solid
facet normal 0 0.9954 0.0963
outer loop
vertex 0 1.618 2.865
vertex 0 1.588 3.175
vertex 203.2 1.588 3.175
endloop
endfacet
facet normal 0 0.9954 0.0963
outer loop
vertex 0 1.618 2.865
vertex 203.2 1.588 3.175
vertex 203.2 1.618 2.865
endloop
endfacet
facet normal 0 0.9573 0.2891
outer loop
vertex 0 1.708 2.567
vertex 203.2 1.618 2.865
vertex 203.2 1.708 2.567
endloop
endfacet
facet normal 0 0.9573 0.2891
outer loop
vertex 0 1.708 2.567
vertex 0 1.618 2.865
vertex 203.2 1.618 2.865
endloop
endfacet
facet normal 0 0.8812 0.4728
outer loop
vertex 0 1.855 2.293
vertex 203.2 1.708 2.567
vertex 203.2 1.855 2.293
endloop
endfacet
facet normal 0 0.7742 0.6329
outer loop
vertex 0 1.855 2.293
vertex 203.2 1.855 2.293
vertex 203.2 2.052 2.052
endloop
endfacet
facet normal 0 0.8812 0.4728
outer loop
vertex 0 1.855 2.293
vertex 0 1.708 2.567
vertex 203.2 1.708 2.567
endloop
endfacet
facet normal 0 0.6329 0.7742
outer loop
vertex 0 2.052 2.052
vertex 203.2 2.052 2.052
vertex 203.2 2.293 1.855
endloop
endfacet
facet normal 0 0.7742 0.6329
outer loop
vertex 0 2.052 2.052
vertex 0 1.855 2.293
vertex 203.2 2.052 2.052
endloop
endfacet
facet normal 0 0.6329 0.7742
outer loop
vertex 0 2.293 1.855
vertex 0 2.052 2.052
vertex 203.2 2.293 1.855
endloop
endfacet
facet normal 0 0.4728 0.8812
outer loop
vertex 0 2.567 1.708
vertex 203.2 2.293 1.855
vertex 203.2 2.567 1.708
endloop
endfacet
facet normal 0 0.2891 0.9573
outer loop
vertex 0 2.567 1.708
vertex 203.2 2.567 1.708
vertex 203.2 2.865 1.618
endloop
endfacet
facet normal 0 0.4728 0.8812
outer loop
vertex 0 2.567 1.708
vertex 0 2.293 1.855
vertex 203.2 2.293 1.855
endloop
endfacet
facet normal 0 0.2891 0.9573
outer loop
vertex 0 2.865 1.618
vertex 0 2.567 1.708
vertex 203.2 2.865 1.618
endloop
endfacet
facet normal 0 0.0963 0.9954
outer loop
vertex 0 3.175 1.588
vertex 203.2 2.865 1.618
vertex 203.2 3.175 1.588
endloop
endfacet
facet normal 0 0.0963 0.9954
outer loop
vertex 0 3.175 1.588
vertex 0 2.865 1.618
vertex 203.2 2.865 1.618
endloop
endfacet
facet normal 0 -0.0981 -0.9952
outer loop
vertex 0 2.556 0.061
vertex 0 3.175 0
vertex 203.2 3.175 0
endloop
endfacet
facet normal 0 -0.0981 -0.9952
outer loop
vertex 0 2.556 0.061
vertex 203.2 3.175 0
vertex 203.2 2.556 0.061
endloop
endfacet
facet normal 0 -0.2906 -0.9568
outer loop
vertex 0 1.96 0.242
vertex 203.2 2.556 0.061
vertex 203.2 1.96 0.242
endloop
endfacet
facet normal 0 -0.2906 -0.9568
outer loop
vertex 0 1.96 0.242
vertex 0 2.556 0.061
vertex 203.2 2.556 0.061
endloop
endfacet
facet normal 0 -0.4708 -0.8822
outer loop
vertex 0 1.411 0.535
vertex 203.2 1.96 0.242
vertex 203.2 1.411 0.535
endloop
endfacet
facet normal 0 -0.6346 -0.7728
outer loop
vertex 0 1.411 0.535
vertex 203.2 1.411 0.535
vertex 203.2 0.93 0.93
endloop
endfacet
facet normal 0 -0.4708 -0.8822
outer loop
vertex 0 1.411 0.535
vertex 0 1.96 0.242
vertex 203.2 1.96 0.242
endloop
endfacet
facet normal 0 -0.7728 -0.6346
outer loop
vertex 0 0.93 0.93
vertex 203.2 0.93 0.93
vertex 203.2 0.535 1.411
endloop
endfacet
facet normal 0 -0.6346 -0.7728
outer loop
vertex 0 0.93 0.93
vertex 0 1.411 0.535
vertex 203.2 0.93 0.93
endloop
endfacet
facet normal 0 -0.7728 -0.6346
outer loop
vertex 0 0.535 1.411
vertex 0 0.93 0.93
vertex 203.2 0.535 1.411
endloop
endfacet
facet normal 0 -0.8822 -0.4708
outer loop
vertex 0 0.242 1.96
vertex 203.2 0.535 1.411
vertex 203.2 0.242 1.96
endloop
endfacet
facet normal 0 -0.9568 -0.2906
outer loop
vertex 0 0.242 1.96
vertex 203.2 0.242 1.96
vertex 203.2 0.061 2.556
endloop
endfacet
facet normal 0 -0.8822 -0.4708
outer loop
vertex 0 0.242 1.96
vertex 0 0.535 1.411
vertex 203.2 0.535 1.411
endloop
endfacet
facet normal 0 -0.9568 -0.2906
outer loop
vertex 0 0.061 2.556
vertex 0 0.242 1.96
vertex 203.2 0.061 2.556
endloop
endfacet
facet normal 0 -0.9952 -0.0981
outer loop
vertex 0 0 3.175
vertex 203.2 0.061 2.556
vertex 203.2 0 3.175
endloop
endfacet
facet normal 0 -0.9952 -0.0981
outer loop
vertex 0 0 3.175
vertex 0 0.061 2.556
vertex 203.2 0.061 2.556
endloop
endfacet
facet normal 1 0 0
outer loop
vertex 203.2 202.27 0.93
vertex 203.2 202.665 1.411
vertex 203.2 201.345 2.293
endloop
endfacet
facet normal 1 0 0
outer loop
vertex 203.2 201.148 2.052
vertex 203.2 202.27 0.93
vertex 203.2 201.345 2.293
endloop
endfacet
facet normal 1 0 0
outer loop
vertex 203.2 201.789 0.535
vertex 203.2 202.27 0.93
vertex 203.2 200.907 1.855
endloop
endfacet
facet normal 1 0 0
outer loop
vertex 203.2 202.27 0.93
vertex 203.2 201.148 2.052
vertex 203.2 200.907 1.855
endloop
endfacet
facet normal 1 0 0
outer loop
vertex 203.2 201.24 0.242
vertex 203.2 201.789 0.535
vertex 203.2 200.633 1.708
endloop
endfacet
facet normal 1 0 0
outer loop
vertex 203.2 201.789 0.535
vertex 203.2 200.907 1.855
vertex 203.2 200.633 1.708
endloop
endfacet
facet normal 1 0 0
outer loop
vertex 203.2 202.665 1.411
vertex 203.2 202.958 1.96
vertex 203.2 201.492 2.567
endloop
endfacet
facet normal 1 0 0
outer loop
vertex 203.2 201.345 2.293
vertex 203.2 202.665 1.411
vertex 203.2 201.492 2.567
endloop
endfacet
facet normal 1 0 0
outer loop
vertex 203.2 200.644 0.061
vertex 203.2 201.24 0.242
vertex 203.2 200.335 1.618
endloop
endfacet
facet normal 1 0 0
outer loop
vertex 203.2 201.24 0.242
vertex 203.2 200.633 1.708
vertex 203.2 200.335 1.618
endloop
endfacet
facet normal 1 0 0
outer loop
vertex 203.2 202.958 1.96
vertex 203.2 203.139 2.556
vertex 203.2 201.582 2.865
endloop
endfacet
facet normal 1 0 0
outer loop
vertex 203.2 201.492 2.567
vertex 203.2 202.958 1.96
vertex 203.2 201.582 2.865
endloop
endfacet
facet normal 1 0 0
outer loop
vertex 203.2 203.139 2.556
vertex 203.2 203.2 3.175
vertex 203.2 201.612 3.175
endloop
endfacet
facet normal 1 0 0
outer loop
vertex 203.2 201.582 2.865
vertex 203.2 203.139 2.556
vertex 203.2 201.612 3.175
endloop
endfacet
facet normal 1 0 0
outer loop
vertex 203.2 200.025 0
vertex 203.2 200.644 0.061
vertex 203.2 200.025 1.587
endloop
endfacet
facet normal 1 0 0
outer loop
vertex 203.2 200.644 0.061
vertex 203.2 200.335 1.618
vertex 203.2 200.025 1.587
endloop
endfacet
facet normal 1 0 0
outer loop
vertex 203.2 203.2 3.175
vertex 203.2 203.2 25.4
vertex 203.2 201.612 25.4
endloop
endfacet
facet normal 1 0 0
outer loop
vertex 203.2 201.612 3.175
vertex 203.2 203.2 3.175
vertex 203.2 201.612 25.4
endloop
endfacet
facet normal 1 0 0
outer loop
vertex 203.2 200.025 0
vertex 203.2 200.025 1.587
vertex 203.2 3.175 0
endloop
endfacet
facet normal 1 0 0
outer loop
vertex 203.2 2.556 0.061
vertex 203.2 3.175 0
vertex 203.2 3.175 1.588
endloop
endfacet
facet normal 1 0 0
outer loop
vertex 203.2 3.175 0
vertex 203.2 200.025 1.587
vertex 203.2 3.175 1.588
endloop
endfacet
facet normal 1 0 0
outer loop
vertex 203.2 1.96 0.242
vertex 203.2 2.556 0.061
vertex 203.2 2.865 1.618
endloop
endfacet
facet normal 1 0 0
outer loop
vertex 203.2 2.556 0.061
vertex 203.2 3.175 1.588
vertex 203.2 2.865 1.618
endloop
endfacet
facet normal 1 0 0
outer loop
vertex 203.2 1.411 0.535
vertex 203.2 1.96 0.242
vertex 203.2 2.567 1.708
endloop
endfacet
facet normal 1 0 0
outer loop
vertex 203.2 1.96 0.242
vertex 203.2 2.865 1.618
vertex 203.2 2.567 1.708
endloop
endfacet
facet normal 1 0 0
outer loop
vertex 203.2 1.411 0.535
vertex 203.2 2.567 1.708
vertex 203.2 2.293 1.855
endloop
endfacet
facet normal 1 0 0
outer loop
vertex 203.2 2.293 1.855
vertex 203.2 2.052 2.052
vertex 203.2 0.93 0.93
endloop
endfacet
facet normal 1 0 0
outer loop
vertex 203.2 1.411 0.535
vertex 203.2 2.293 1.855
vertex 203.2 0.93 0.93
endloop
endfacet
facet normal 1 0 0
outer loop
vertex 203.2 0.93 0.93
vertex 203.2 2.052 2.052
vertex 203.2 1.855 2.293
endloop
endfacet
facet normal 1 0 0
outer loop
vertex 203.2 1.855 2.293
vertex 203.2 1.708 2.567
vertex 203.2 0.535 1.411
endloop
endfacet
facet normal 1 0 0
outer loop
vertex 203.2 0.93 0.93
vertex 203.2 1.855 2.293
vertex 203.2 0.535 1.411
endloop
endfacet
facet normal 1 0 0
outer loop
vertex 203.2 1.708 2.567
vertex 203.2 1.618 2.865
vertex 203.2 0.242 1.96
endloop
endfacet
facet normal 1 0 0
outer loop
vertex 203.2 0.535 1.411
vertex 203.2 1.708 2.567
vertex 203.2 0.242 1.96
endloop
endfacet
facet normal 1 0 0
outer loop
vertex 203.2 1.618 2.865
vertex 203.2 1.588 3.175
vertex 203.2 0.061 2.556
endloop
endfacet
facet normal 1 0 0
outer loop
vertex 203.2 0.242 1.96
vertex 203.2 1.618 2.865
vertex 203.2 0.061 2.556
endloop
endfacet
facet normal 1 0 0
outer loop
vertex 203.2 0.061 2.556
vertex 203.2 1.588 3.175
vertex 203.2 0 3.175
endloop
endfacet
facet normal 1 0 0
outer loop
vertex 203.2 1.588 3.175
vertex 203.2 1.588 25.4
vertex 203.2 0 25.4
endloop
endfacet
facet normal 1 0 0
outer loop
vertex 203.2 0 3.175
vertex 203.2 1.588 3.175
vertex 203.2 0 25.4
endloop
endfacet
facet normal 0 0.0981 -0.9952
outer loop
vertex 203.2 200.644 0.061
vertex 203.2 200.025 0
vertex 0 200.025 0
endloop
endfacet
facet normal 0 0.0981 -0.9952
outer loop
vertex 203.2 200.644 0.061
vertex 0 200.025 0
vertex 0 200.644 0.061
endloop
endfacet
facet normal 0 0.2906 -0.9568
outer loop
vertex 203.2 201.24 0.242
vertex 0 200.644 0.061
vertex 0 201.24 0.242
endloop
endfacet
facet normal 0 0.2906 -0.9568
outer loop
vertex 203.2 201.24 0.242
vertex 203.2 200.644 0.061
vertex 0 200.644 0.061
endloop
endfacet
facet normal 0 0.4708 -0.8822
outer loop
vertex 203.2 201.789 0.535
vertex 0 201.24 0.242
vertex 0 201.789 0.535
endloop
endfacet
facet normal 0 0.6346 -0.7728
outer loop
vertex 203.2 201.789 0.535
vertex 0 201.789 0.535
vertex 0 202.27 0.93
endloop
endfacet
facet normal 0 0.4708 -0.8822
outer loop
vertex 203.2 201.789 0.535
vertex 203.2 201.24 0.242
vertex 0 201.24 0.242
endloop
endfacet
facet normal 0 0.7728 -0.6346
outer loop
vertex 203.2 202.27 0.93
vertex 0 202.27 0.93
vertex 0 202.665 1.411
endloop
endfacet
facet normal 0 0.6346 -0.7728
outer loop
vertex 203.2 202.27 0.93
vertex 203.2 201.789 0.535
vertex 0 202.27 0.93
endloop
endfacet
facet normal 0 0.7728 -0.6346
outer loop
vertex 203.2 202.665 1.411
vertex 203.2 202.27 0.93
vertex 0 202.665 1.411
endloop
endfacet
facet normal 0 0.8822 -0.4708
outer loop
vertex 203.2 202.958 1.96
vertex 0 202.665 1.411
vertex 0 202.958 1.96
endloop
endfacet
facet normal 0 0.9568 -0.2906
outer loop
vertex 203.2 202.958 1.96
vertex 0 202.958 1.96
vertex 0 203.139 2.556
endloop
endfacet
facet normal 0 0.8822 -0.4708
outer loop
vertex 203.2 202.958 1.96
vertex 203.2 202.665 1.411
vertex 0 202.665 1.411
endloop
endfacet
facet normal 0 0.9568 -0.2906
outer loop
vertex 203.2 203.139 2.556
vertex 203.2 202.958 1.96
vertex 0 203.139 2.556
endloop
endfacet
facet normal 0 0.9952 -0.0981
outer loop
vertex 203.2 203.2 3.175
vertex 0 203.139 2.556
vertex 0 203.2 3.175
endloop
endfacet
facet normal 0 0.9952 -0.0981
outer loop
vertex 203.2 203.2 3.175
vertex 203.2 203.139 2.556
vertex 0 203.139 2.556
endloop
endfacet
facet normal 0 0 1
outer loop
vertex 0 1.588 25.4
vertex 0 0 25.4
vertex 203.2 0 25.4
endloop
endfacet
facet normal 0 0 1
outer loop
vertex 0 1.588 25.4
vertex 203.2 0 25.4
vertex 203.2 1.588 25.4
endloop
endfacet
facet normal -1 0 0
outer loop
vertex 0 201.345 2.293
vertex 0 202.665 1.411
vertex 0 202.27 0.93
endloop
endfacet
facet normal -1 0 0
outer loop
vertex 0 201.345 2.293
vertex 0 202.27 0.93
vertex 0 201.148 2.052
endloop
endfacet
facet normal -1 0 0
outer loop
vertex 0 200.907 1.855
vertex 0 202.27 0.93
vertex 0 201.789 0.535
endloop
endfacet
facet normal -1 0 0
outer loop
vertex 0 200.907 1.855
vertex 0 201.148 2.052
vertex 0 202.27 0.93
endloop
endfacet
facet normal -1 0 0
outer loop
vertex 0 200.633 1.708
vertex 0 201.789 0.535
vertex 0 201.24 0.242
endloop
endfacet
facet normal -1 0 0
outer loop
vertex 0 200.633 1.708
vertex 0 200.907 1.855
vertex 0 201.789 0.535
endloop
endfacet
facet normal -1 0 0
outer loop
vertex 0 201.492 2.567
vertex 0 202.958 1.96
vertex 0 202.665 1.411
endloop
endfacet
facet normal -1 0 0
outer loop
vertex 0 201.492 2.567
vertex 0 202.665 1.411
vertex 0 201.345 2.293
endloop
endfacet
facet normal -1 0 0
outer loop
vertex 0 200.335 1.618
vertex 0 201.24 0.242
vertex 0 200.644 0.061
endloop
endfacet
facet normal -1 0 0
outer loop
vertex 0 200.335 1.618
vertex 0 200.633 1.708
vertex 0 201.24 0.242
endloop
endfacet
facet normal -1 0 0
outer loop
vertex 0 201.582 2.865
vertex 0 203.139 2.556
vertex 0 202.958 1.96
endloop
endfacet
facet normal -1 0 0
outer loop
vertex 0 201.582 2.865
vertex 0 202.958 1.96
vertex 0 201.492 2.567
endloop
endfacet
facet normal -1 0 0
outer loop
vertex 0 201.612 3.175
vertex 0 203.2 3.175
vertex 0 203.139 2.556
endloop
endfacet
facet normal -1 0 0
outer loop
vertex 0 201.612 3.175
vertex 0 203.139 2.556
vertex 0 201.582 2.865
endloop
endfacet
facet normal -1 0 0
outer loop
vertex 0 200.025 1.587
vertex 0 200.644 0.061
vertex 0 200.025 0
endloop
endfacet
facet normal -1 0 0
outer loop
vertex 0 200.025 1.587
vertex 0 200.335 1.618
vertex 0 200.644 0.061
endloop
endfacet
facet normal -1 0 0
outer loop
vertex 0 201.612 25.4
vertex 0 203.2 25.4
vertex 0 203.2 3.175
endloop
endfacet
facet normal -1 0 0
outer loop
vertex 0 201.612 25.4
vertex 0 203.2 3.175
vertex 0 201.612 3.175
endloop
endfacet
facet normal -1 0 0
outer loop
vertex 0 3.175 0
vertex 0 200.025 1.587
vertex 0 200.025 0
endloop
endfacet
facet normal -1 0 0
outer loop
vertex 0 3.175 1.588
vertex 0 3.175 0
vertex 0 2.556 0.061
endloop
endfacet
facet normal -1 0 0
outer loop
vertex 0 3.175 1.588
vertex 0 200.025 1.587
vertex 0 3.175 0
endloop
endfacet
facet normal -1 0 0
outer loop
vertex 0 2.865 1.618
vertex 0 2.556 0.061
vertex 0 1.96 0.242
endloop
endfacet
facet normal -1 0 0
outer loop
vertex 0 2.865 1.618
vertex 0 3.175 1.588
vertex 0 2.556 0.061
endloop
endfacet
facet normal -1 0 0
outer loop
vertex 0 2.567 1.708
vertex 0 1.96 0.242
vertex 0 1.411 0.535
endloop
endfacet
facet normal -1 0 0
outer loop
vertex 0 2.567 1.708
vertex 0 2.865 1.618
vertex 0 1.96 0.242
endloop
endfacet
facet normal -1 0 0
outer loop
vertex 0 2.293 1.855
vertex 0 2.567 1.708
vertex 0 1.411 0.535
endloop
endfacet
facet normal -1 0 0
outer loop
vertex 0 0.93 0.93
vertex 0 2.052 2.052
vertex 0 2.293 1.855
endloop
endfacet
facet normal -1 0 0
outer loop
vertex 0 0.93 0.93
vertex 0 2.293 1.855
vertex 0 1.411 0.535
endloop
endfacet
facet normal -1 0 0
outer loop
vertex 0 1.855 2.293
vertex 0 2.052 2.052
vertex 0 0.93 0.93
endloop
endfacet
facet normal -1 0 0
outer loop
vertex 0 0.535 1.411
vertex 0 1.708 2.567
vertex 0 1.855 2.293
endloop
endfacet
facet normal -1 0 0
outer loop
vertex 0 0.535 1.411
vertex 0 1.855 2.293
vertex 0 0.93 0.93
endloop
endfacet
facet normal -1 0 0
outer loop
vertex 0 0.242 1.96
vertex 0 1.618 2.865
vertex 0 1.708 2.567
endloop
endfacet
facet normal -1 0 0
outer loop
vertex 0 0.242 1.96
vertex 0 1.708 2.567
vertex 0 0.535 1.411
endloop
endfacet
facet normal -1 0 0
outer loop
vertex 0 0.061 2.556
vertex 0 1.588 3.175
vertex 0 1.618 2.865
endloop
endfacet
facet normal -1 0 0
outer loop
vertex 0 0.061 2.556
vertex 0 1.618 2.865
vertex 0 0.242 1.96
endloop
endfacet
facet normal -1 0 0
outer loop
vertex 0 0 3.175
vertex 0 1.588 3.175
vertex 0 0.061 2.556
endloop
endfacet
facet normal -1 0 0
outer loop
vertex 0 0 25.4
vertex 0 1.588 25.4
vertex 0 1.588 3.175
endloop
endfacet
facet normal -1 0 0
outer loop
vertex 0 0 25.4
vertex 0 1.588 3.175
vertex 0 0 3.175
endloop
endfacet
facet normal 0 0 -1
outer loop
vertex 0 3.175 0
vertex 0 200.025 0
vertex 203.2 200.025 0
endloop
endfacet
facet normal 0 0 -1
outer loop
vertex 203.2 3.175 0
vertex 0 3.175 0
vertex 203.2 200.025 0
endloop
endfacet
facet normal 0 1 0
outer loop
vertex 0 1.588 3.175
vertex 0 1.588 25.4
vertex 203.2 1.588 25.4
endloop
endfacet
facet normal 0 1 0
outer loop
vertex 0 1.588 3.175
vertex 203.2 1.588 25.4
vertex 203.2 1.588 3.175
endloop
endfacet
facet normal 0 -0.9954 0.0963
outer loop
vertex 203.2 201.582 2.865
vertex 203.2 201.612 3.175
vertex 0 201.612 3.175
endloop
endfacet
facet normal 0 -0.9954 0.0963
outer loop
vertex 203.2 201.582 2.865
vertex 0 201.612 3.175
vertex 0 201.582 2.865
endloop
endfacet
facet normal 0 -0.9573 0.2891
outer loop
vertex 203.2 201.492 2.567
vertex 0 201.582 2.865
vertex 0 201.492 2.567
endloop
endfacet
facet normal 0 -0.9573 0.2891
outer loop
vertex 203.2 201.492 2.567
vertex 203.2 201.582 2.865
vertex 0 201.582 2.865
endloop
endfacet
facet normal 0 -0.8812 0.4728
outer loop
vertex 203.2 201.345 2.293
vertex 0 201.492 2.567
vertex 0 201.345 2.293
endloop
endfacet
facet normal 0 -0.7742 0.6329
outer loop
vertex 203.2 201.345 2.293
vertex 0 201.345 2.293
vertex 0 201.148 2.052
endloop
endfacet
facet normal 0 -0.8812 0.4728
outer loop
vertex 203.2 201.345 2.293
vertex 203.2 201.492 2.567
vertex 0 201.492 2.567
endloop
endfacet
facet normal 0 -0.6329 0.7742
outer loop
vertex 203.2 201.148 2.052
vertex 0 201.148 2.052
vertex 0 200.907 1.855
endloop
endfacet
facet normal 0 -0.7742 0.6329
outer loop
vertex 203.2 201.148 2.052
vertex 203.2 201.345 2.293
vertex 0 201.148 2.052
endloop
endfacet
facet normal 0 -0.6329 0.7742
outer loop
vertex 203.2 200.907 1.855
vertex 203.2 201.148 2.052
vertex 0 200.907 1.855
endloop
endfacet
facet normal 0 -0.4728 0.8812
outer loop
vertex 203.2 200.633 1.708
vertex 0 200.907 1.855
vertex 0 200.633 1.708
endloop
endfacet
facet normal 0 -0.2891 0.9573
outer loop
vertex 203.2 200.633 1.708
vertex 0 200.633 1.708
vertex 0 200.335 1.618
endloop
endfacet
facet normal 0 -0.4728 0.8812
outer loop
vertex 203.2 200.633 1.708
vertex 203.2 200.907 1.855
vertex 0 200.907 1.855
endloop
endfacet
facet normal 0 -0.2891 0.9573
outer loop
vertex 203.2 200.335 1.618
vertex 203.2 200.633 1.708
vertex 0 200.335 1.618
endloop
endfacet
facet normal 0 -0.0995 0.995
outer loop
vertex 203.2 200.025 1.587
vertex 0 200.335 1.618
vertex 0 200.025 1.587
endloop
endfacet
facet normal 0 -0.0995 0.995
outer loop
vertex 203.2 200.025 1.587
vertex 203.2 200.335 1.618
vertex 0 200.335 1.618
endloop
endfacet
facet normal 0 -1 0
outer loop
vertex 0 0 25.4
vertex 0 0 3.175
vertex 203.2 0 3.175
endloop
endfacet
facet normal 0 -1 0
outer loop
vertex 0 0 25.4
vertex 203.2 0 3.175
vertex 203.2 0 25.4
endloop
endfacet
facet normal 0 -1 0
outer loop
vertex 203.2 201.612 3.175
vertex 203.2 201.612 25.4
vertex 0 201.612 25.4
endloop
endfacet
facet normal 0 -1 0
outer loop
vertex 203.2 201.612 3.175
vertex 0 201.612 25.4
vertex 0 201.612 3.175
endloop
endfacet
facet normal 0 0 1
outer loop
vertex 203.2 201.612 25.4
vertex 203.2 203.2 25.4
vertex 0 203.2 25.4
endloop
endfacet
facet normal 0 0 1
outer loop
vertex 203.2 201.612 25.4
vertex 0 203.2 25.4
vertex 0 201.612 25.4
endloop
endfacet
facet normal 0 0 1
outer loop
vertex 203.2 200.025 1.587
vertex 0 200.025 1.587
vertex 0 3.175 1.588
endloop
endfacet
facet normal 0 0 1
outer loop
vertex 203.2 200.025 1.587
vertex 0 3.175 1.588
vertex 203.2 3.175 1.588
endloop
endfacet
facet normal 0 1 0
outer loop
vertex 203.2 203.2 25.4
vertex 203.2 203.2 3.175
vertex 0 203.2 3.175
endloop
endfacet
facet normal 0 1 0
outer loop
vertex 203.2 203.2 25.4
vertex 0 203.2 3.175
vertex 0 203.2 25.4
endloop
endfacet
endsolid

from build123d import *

# Parameters (mm, degrees)
SKETCH1_W                      = 203.2
SKETCH1_H                      = 203.2
BOSS_EXTRUDE2_DEPTH            = 1.5875
EDGE_FLANGE1_STRIP_W           = 9.525
EDGE_FLANGE1_STRIP_H           = 1.5875
EDGE_FLANGE1_STRIP_CUT_DEPTH   = 203.2
EDGE_FLANGE1_STRIP_2_W         = 9.525
EDGE_FLANGE1_STRIP_2_H         = 1.5875
EDGE_FLANGE1_STRIP_CUT_2_DEPTH = 203.2
EDGE_FLANGE1_DEPTH             = 203.2
EDGE_FLANGE1_BEND_DEPTH        = 203.2


# Sheet-metal steps are written as plain solids
with BuildPart() as part:
    # Sketch1 → Boss-Extrude2 (new body)
    with BuildSketch(Plane.XY):
        with Locations((101.6, 101.6)):
            Rectangle(SKETCH1_W, SKETCH1_H)
    extrude(amount=BOSS_EXTRUDE2_DEPTH)

    # Edge-Flange1 strip (across the edge) → Edge-Flange1 strip cut (cut)
    with BuildSketch(Plane(origin=(203.2, 203.2, 1.5875), x_dir=(0, -1, 0), z_dir=(-1, 0, 0))):
        with Locations((-1.5875, -0.79375)):
            Rectangle(EDGE_FLANGE1_STRIP_W, EDGE_FLANGE1_STRIP_H)
    extrude(amount=EDGE_FLANGE1_STRIP_CUT_DEPTH, mode=Mode.SUBTRACT)

    # Edge-Flange1 strip 2 (across the edge) → Edge-Flange1 strip cut 2 (cut)
    with BuildSketch(Plane(origin=(0, 0, 1.5875), x_dir=(0, 1, 0), z_dir=(1, 0, 0))):
        with Locations((-1.5875, -0.79375)):
            Rectangle(EDGE_FLANGE1_STRIP_2_W, EDGE_FLANGE1_STRIP_2_H)
    extrude(amount=EDGE_FLANGE1_STRIP_CUT_2_DEPTH, mode=Mode.SUBTRACT)

    # Edge-Flange1 section (across the edge) → Edge-Flange1 (add)
    with BuildSketch(Plane(origin=(203.2, 203.2, 1.5875), x_dir=(0, -1, 0), z_dir=(-1, 0, 0))):
        with BuildLine():
            Line((0, 1.5875), (0, 23.8125))
            Line((0, 23.8125), (1.5875, 23.8125))
            Line((1.5875, 23.8125), (1.5875, 1.5875))
            ThreePointArc((1.5875, 1.5875), (2.052467985, 0.464967985), (3.175, 0))
            Line((3.175, 0), (3.175, -1.5875))
            ThreePointArc((3.175, -1.5875), (0.92993597, -0.65756403), (0, 1.5875))
        make_face()
    extrude(amount=EDGE_FLANGE1_DEPTH)

    # Edge-Flange1 section 2 (across the edge) → Edge-Flange1 bend (add)
    with BuildSketch(Plane(origin=(0, 0, 1.5875), x_dir=(0, 1, 0), z_dir=(1, 0, 0))):
        with BuildLine():
            Line((0, 1.5875), (0, 23.8125))
            Line((0, 23.8125), (1.5875, 23.8125))
            Line((1.5875, 23.8125), (1.5875, 1.5875))
            ThreePointArc((1.5875, 1.5875), (2.052467985, 0.464967985), (3.175, 0))
            Line((3.175, 0), (3.175, -1.5875))
            ThreePointArc((3.175, -1.5875), (0.92993597, -0.65756403), (0, 1.5875))
        make_face()
    extrude(amount=EDGE_FLANGE1_BEND_DEPTH)


solid = part.part
